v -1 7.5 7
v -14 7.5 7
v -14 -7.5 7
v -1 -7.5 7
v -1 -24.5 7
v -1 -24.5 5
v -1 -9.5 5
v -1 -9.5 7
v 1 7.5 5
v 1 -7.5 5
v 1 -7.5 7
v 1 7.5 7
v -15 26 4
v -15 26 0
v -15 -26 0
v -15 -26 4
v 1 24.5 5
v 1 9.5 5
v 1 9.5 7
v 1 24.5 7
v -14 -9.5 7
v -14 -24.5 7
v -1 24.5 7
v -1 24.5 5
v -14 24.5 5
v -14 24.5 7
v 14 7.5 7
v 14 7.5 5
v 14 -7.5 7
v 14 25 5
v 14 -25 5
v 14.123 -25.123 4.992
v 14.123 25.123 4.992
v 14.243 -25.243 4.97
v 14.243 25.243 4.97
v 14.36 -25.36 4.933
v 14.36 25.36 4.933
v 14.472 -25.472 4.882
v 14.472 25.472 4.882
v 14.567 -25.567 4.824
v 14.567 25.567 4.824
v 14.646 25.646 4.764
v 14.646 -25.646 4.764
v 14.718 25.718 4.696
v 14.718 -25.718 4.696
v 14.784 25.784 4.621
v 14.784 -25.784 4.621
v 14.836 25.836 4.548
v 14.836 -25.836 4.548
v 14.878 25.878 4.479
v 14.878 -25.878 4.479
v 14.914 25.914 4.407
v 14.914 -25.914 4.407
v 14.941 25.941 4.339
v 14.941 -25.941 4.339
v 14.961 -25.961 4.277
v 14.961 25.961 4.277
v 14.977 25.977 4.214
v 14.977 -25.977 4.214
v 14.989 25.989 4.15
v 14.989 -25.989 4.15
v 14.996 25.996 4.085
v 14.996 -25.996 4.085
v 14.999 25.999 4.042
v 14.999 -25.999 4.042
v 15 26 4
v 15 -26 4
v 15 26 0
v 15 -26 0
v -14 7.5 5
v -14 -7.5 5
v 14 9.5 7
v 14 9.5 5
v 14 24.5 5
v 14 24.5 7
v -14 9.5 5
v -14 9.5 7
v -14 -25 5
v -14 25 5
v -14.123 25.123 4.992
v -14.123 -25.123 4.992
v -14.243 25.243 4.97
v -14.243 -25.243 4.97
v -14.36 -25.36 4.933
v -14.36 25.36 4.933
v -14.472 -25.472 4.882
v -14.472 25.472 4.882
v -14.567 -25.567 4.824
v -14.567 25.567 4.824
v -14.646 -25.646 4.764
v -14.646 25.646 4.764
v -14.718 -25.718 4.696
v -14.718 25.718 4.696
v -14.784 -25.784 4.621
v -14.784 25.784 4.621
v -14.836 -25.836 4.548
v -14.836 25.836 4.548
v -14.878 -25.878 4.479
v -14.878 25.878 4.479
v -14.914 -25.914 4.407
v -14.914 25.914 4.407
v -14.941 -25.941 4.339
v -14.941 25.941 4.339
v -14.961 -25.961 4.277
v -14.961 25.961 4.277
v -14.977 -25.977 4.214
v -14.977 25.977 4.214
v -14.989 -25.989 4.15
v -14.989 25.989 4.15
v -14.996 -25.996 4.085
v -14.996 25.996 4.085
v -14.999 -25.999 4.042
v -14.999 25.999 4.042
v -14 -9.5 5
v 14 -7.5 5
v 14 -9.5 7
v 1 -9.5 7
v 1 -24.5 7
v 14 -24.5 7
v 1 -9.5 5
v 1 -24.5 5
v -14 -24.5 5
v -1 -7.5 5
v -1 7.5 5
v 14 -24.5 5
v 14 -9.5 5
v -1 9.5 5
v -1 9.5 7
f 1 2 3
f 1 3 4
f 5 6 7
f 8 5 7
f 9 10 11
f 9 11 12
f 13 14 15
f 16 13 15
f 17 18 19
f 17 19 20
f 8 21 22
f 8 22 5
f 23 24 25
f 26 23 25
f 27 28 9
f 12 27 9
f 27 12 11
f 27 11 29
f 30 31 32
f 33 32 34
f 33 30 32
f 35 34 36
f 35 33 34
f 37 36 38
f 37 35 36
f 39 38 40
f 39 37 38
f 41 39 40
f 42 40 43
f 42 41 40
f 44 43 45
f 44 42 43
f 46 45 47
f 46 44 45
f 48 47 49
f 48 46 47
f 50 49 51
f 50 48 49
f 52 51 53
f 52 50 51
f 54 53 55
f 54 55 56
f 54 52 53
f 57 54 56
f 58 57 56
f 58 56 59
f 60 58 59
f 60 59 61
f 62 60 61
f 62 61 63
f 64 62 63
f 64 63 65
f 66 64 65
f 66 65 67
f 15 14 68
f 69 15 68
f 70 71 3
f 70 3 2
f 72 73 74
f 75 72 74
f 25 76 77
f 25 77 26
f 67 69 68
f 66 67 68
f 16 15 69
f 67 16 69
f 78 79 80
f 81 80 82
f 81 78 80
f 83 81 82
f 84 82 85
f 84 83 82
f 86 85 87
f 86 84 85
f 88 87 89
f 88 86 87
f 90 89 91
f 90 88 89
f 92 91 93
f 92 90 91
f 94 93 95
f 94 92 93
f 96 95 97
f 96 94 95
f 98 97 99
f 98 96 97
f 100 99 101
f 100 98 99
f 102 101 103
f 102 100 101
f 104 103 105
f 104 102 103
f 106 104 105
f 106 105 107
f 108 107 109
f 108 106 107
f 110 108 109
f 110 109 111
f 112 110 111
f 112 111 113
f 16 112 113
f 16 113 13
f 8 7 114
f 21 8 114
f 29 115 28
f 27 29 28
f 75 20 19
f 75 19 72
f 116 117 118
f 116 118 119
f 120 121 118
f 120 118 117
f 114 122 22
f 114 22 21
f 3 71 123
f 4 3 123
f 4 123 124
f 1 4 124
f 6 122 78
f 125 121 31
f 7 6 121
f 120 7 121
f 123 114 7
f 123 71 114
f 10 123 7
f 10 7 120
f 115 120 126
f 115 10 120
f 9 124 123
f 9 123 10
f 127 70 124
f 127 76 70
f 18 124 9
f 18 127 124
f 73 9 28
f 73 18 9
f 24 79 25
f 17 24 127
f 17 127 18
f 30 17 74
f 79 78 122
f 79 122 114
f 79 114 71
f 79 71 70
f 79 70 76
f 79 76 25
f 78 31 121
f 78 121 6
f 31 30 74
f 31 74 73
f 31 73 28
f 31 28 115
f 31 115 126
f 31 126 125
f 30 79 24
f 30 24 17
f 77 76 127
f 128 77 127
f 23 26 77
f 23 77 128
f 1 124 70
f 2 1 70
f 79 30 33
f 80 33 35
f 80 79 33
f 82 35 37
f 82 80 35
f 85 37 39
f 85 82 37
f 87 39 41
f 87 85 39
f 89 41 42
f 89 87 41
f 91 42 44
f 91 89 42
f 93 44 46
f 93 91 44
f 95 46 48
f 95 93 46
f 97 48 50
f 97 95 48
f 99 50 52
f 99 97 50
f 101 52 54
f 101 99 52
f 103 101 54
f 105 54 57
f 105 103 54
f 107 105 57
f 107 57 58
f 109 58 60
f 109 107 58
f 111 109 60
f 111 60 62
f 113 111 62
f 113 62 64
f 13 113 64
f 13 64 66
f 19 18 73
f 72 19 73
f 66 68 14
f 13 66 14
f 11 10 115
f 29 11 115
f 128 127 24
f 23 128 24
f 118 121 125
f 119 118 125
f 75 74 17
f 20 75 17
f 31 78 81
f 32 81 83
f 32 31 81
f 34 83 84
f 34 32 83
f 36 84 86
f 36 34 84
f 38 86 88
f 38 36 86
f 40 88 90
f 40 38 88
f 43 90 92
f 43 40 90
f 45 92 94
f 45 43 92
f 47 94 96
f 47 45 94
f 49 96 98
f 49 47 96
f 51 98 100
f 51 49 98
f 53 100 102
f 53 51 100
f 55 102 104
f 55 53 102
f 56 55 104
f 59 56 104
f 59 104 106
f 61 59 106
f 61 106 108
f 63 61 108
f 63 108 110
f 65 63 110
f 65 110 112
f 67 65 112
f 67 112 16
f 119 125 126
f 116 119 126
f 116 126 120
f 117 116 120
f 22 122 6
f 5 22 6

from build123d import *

# Parameters (mm, degrees)
F0_W     = 6.5
F0_H     = 15
F1_DEPTH = 7
F2_DEPTH = 5
F4_R     = 0.99999


# Not quite as in the source:
# - a fillet or chamfer is up to 0.001 mm smaller than in the source, because OpenCascade refuses the exact size
# - a feature names something its author has since deleted; it is built from what else it names


with BuildPart() as f1:
    # F0 (on Top) → F1 (new body)
    with BuildSketch(Plane.XY):
        with Locations((-4.25, 17)):
            Rectangle(F0_W, F0_H)
        with Locations((-10.75, 17)):
            Rectangle(F0_W, F0_H)
    extrude(amount=F1_DEPTH)


with BuildPart() as f1b:
    # F0 (on Top) → F1, piece 2 (new body)
    with BuildSketch(Plane.XY):
        with Locations((-10.75, 0)):
            Rectangle(F0_W, F0_H)
        with Locations((-4.25, 0)):
            Rectangle(F0_W, F0_H)
    extrude(amount=F1_DEPTH)


with BuildPart() as f1c:
    # F0 (on Top) → F1, piece 3 (new body)
    with BuildSketch(Plane.XY):
        with Locations((-4.25, -17)):
            Rectangle(F0_W, F0_H)
        with Locations((-10.75, -17)):
            Rectangle(F0_W, F0_H)
    extrude(amount=F1_DEPTH)


with BuildPart() as f1d:
    # F0 (on Top) → F1, piece 4 (new body)
    with BuildSketch(Plane.XY):
        with Locations((4.25, -17)):
            Rectangle(F0_W, F0_H)
        with Locations((10.75, -17)):
            Rectangle(F0_W, F0_H)
    extrude(amount=F1_DEPTH)


with BuildPart() as f1e:
    # F0 (on Top) → F1, piece 5 (new body)
    with BuildSketch(Plane.XY):
        with Locations((10.75, 0)):
            Rectangle(F0_W, F0_H)
        with Locations((4.25, 0)):
            Rectangle(F0_W, F0_H)
    extrude(amount=F1_DEPTH)


with BuildPart() as f1f:
    # F0 (on Top) → F1, piece 6 (new body)
    with BuildSketch(Plane.XY):
        with Locations((4.25, 17)):
            Rectangle(F0_W, F0_H)
        with Locations((10.75, 17)):
            Rectangle(F0_W, F0_H)
    extrude(amount=F1_DEPTH)


with BuildPart() as f2:
    # F0 (on Top) → F2 (new body)
    with BuildSketch(Plane.XY):
        Polygon((-7.5, 24.5), (-7.5, 26), (-15, 26), (-15, -26), (-7.5, -26), (-7.5, -24.5), (-14, -24.5), (-14, -9.5), (-7.5, -9.5), (-7.5, -7.5), (-14, -7.5), (-14, 7.5), (-7.5, 7.5), (-7.5, 9.5), (-14, 9.5), (-14, 24.5), align=None)
        Polygon((7.5, 24.5), (7.5, 26), (-7.5, 26), (-7.5, 24.5), (-1, 24.5), (-1, 9.5), (-7.5, 9.5), (-7.5, 7.5), (-1, 7.5), (-1, -7.5), (-7.5, -7.5), (-7.5, -9.5), (-1, -9.5), (-1, -24.5), (-7.5, -24.5), (-7.5, -26), (7.5, -26), (7.5, -24.5), (1, -24.5), (1, -9.5), (7.5, -9.5), (7.5, -7.5), (1, -7.5), (1, 7.5), (7.5, 7.5), (7.5, 9.5), (1, 9.5), (1, 24.5), align=None)
        Polygon((15, -26), (15, 26), (7.5, 26), (7.5, 24.5), (14, 24.5), (14, 9.5), (7.5, 9.5), (7.5, 7.5), (14, 7.5), (14, -7.5), (7.5, -7.5), (7.5, -9.5), (14, -9.5), (14, -24.5), (7.5, -24.5), (7.5, -26), align=None)
    extrude(amount=F2_DEPTH)


with BuildPart() as f1f_1:
    add(f1f.part)

    # F3: union F1b, F1c, F2, F1, F1d, F1e
    add(f1b.part)
    add(f1c.part)
    add(f2.part)
    add(f1.part)
    add(f1d.part)
    add(f1e.part)

    # F4 (radius 1 in the source; OpenCascade refuses exactly that, so slightly less here)
    f4_edges = [f1f_1.edges().sort_by_distance(p)[0] for p in [
        (-15, 0, 5),
        (0, -26, 5),
        (15, 0, 5),
        (0, 26, 5),
    ]]
    fillet(f4_edges, radius=F4_R)


solid = f1f_1.part
